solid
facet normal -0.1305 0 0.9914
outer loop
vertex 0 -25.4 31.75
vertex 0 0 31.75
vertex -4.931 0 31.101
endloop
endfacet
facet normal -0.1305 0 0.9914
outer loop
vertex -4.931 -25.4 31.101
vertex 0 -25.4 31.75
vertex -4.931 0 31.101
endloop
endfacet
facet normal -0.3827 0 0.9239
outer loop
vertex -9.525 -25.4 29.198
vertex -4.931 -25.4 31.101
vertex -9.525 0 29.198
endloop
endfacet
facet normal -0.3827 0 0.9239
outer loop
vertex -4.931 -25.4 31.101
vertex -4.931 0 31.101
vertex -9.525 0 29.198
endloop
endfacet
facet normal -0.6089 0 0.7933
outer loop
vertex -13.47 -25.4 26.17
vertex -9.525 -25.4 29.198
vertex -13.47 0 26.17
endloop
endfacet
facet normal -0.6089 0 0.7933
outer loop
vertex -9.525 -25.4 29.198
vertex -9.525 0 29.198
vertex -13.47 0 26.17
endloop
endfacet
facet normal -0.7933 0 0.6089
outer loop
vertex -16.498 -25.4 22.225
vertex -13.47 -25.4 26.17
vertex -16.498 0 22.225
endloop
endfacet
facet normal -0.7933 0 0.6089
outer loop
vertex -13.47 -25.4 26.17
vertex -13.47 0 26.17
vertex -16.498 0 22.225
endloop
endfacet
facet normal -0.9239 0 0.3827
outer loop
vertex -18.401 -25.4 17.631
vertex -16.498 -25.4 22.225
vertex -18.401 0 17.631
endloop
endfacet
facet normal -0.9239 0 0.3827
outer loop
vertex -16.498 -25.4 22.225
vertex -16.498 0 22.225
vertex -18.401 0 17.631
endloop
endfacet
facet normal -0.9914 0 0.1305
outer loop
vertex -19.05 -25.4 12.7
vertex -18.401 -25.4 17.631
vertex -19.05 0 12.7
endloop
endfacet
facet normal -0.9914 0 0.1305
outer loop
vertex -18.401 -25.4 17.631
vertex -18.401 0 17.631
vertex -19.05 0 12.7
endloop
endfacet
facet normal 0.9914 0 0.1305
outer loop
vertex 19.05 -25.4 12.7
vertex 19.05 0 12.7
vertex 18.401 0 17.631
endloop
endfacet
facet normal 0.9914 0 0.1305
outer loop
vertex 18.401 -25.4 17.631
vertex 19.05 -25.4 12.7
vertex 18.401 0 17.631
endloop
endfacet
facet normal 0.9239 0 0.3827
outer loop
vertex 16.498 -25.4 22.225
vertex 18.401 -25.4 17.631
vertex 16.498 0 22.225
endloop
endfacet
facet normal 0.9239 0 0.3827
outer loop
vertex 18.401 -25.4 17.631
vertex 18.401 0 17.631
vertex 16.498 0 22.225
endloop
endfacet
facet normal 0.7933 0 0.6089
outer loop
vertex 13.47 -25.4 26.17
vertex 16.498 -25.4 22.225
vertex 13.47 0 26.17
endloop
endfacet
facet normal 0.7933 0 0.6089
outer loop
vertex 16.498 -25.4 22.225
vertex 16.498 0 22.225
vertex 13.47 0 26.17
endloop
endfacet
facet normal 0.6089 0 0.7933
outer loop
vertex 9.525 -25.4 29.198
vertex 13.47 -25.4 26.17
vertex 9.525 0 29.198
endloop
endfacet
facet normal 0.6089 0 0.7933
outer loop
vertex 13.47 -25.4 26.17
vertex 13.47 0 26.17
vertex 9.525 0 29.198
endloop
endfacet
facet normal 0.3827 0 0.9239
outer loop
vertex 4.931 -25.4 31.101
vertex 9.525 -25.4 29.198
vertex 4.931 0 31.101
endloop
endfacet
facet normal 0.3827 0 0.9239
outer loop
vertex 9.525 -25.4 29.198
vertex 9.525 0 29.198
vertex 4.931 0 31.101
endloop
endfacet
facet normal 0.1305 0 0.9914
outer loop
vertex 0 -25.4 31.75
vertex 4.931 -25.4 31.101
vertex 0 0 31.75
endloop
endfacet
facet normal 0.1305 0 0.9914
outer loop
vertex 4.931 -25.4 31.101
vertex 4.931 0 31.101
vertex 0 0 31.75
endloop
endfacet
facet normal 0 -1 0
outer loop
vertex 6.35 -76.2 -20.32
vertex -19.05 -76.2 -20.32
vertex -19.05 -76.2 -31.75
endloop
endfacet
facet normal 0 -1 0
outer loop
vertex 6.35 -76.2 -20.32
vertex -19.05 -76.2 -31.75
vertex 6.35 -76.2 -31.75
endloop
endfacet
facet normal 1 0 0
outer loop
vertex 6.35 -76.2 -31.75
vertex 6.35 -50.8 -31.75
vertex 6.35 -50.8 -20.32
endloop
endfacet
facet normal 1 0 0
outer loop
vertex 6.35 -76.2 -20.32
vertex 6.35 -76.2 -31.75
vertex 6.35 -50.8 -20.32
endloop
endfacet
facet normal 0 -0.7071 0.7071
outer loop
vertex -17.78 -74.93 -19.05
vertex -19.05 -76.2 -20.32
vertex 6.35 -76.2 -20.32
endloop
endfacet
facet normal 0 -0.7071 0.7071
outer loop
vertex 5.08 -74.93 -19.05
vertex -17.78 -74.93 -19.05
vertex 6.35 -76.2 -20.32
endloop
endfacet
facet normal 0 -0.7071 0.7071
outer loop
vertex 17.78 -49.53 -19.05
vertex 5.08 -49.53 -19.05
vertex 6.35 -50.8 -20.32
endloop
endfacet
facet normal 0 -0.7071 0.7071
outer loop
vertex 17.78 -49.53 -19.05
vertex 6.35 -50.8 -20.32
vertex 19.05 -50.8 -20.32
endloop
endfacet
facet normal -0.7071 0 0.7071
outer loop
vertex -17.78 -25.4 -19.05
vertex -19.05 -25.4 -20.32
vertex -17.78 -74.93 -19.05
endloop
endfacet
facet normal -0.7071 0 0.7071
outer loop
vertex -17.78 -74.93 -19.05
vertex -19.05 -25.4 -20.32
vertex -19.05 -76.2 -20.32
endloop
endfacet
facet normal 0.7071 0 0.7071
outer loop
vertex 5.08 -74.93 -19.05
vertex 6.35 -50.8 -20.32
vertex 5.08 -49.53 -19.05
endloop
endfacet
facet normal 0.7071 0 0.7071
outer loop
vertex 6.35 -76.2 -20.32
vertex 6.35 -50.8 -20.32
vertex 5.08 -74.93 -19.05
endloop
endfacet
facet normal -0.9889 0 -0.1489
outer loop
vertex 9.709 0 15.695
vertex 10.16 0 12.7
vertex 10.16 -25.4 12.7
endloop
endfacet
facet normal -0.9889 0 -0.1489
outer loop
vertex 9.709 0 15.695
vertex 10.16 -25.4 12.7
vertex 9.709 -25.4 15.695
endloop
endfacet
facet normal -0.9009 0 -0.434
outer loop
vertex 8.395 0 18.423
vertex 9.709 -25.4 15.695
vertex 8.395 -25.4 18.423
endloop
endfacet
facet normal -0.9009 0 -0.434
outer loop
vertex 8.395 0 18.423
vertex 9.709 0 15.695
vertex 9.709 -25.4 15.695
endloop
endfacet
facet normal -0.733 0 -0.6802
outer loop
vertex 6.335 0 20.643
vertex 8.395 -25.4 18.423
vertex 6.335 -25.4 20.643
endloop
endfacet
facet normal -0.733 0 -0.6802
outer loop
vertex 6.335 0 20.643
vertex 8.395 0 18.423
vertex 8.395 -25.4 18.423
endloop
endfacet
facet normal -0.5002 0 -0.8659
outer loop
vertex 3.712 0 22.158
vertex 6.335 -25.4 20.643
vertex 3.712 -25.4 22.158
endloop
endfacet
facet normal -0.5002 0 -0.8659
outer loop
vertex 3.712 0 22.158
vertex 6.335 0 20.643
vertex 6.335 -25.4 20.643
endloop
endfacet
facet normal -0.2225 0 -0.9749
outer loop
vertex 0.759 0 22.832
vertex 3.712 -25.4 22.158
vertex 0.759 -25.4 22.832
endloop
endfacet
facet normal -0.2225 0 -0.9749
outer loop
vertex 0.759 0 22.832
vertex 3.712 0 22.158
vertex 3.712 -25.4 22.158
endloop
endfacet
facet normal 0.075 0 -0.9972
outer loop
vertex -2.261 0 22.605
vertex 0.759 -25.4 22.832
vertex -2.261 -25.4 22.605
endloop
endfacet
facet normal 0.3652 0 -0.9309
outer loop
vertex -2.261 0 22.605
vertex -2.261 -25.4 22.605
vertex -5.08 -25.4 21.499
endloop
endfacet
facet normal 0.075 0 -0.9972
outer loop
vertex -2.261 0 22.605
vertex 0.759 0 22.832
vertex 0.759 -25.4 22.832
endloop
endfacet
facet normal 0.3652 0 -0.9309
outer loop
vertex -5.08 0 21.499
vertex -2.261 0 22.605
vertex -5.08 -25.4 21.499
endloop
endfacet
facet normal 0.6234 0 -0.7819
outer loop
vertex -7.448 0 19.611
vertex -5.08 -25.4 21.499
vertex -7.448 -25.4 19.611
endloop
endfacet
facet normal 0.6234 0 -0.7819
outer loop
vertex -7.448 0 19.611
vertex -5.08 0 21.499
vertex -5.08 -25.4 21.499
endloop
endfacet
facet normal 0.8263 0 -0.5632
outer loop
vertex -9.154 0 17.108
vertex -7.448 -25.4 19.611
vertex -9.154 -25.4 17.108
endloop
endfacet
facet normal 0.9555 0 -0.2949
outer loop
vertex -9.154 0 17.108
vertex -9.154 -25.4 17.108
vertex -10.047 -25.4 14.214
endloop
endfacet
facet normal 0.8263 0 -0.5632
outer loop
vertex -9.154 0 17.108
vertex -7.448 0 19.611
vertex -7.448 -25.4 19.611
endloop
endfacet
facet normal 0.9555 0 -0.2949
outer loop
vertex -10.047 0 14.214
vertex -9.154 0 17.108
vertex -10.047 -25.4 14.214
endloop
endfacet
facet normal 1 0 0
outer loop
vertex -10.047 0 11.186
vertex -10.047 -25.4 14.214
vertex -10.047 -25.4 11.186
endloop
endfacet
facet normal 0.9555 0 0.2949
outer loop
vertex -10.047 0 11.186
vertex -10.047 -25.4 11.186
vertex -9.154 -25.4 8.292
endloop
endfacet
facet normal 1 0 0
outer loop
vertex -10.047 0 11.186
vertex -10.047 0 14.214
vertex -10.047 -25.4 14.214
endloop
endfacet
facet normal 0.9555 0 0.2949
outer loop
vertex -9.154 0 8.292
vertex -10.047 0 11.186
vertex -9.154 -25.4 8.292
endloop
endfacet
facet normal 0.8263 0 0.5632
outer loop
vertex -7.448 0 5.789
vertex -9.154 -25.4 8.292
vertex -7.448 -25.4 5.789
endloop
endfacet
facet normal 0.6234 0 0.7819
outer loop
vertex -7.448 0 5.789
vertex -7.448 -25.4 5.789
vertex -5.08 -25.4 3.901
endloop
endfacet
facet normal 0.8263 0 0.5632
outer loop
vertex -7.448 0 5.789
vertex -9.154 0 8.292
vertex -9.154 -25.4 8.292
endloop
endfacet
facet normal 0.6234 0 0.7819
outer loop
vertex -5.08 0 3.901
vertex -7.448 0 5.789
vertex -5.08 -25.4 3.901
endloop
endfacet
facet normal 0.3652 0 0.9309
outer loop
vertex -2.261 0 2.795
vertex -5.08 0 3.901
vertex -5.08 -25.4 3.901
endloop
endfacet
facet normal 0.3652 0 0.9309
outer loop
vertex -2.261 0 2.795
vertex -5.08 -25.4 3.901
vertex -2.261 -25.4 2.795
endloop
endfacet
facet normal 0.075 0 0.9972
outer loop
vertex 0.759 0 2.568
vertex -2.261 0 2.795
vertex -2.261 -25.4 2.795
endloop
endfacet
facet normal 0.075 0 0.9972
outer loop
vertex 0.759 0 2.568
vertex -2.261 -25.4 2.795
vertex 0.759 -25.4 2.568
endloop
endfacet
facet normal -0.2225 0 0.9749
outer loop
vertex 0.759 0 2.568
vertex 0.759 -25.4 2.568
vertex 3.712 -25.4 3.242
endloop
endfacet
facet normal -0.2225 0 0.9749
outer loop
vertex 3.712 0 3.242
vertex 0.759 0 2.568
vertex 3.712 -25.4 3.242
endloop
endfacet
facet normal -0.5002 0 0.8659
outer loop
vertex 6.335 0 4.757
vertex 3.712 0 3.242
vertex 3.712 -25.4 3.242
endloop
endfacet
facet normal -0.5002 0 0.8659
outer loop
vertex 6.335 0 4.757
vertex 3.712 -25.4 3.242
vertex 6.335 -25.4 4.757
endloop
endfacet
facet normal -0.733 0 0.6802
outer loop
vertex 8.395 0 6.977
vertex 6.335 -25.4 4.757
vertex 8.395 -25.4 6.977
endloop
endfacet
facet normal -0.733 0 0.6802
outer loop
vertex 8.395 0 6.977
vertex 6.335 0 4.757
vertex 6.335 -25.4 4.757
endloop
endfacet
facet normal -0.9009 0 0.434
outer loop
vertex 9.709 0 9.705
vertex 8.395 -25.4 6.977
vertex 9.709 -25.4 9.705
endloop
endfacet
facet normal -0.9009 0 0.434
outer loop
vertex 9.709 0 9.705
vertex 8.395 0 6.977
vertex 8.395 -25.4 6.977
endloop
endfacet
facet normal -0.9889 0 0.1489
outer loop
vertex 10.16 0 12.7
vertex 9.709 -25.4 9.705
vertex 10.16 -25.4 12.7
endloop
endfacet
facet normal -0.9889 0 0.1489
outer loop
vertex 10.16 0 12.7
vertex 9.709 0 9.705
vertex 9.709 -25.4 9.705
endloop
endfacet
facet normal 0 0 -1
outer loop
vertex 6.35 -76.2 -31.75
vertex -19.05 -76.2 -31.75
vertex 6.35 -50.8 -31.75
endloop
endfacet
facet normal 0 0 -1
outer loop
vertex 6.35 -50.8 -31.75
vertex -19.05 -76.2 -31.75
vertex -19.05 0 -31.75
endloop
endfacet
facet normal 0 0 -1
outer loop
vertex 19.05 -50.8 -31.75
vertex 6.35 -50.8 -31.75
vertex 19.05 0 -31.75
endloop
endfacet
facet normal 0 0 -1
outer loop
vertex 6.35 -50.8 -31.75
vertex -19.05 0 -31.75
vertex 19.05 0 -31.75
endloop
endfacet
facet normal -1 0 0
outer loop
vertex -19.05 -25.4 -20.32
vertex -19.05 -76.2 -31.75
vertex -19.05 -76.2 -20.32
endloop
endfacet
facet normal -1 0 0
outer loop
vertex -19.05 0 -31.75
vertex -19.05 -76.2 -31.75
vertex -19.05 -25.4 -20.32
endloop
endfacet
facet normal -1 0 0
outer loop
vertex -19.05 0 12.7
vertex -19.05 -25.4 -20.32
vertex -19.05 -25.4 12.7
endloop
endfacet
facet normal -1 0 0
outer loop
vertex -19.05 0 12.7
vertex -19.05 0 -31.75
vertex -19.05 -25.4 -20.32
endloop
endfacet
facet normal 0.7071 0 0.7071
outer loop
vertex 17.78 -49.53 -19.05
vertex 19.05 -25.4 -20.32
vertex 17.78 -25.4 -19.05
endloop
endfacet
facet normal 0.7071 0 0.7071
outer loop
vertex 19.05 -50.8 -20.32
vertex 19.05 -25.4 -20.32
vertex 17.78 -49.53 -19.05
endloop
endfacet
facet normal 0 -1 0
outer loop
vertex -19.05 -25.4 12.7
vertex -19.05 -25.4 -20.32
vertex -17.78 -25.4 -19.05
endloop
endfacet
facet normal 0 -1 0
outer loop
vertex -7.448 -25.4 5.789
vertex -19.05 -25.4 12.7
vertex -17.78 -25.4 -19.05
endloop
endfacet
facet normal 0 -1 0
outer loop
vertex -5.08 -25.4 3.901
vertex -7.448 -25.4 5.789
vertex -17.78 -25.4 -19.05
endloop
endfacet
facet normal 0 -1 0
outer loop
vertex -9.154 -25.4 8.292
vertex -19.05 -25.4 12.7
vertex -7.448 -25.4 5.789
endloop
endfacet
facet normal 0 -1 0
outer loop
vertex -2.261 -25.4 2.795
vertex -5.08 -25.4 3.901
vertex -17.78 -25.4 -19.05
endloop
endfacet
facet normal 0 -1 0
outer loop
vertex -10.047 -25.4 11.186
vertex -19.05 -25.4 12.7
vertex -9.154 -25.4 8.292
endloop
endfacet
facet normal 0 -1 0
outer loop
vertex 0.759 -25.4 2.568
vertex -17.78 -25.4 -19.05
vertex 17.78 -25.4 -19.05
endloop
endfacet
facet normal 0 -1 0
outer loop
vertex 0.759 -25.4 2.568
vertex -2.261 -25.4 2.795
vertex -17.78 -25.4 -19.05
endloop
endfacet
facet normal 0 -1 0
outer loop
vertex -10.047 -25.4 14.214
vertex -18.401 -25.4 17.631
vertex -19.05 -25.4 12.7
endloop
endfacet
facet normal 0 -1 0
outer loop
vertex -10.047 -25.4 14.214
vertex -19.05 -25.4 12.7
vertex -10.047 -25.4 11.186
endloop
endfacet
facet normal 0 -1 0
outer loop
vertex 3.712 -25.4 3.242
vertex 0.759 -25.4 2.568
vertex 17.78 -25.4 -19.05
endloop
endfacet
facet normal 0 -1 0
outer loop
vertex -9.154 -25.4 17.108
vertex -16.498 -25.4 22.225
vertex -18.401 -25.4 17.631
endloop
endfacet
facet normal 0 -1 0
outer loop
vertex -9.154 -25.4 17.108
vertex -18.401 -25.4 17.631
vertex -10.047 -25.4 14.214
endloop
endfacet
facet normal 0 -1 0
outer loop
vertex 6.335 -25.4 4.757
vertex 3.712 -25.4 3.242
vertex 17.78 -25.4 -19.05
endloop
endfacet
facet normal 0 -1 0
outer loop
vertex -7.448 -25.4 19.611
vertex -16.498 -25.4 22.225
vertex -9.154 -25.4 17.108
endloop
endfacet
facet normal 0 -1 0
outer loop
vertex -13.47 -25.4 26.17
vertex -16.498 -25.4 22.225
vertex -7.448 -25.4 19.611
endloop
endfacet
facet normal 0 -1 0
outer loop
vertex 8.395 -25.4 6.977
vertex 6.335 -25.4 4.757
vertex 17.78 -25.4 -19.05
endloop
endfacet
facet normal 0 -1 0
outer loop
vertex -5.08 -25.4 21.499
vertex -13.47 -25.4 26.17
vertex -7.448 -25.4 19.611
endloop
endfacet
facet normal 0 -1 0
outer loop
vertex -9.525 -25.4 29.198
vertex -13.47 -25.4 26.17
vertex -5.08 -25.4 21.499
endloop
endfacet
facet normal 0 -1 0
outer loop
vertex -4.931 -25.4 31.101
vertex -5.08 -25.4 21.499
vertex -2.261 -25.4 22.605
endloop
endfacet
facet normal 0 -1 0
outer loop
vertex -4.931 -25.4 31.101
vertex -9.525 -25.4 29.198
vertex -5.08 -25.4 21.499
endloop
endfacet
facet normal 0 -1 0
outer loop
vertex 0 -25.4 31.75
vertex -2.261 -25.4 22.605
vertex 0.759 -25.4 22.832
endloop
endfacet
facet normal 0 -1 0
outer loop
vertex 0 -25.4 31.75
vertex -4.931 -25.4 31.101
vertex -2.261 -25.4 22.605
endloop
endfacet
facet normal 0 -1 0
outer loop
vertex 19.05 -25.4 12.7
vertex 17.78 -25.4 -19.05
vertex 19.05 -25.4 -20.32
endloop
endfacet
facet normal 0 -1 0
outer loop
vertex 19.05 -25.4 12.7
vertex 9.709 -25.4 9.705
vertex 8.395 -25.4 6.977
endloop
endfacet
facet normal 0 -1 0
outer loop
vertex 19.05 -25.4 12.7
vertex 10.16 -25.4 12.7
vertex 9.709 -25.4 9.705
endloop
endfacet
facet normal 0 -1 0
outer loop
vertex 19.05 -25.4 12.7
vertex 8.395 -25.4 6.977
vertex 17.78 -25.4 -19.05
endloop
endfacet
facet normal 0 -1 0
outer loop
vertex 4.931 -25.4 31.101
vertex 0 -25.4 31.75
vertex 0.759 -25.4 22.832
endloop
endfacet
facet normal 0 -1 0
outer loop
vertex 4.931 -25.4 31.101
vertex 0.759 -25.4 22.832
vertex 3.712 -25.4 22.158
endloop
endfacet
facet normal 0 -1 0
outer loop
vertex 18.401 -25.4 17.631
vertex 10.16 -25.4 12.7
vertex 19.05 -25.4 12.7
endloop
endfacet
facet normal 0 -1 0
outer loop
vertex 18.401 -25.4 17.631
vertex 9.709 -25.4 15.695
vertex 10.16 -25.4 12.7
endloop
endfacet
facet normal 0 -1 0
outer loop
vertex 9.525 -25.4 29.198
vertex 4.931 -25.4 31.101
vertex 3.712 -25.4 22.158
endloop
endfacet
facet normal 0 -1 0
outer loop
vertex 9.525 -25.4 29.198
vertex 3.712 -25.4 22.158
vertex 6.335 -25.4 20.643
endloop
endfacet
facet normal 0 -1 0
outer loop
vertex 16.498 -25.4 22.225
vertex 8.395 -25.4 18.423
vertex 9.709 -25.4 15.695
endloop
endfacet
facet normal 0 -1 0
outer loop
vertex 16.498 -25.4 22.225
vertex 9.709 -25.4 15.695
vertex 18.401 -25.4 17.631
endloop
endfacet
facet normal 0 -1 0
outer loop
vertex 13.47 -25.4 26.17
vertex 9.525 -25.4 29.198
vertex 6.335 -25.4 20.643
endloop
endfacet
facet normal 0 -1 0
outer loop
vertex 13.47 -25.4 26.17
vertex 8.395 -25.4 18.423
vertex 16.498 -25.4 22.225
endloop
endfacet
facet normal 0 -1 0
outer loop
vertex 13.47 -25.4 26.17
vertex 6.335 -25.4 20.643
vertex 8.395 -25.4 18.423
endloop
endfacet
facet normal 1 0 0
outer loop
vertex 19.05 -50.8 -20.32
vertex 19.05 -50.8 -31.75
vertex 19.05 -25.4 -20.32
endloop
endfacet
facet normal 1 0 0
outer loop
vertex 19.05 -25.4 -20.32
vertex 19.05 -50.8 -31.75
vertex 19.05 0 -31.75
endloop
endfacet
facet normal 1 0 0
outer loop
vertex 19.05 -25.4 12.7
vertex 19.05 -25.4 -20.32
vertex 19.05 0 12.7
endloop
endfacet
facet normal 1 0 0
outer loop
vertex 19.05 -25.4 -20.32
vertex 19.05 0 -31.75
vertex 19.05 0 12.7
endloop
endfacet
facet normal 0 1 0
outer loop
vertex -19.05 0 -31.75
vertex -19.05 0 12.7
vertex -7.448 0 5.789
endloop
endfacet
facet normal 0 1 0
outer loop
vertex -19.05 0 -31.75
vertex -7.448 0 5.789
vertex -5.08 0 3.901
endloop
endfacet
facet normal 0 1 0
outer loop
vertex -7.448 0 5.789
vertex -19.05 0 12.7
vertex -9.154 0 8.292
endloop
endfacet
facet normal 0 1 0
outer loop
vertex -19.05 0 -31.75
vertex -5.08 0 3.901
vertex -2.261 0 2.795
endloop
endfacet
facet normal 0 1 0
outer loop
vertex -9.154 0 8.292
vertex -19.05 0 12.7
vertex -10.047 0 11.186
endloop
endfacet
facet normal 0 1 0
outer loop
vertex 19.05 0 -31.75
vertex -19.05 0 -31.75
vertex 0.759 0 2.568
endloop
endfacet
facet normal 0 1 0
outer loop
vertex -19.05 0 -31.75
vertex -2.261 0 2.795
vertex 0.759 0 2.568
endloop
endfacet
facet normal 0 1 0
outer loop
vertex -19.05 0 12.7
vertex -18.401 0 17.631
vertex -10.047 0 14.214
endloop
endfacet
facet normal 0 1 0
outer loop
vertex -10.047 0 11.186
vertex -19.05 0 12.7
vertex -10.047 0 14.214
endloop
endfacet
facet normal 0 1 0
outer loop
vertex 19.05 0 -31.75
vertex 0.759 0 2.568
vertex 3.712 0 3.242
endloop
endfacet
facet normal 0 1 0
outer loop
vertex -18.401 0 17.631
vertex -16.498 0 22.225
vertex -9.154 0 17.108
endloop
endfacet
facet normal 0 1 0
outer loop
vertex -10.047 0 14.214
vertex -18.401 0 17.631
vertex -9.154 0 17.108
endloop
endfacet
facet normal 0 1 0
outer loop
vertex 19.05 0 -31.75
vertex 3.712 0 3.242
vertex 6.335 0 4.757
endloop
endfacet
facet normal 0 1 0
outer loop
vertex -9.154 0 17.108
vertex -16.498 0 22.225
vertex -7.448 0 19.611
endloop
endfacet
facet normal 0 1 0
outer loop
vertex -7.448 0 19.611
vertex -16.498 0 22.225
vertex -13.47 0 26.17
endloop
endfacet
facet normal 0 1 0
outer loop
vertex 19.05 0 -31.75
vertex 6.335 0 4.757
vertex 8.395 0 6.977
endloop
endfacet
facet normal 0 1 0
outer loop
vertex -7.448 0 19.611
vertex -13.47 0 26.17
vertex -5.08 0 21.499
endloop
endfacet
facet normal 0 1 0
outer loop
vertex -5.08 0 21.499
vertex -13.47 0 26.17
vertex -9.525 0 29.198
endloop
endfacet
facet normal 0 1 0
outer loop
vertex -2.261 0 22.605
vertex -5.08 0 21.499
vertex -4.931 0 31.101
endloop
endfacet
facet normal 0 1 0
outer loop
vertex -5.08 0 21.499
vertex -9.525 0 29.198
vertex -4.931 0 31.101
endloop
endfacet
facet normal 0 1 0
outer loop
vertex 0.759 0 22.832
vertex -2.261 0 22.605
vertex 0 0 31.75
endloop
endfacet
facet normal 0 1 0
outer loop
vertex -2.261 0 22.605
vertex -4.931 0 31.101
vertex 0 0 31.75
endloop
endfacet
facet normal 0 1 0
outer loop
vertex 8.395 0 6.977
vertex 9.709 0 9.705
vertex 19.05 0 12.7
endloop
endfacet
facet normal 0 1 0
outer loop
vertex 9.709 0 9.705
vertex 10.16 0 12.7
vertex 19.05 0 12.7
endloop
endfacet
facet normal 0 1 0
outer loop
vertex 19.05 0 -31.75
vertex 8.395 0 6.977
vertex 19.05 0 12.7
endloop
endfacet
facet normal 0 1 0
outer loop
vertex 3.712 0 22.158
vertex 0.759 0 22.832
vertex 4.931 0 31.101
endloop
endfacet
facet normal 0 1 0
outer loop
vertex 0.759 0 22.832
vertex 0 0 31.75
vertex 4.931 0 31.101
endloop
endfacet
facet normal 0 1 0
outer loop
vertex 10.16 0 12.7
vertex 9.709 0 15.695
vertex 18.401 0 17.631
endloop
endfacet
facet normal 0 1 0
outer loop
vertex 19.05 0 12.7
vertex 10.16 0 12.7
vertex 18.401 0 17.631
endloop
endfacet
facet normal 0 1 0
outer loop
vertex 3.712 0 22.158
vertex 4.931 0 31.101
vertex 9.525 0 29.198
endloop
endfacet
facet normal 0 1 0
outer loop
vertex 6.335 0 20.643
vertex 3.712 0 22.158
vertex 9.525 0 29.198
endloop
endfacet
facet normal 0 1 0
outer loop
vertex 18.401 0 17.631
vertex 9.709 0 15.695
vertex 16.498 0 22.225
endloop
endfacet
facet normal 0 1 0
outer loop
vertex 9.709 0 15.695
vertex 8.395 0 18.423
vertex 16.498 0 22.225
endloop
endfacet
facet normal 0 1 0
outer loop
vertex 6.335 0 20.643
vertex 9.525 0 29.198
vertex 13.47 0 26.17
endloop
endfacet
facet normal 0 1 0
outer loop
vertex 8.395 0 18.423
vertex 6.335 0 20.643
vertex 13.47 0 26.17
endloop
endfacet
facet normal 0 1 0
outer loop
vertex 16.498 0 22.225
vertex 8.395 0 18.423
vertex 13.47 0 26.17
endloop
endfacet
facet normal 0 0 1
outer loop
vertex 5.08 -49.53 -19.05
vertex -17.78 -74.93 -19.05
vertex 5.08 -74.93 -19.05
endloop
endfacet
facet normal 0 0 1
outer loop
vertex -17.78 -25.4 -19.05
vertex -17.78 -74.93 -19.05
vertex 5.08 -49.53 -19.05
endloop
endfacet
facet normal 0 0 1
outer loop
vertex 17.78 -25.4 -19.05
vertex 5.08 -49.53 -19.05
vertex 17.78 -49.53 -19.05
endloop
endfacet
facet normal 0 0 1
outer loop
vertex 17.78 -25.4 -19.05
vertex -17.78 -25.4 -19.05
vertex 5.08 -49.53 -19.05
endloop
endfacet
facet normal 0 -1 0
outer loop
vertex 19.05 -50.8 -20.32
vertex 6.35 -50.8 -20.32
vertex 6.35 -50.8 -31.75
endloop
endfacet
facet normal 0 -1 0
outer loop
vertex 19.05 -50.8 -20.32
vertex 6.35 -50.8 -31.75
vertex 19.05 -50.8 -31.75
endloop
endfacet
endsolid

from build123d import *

# Parameters (mm, degrees)
F0_R     = 10.16
F1_DEPTH = 25.4
F2_W     = 25.4
F2_H     = 12.7
F3_DEPTH = 50.8
F4_W     = 12.7
F4_H     = 12.7
F5_DEPTH = 25.4
F6_SIZE  = 1.27


with BuildPart() as f1:
    # F0 (on Front) → F1 (new body)
    with BuildSketch(Plane.XZ):
        with BuildLine():
            Line((-19.05, 12.7), (-19.05, -31.75))
            Line((-19.05, -31.75), (19.05, -31.75))
            Line((19.05, -31.75), (19.05, 12.7))
            ThreePointArc((19.05, 12.7), (13.4703841797, 26.1703841835), (-5.4e-09, 31.75))
            ThreePointArc((-5.4e-09, 31.75), (-13.4703841835, 26.1703841797), (-19.05, 12.7))
        make_face()
        with Locations((0, 12.7)):
            Circle(F0_R, mode=Mode.SUBTRACT)
    extrude(amount=F1_DEPTH)

    # F2 (on face) → F3 (join)
    with BuildSketch(Plane.XZ.offset(25.4)):
        with Locations((-6.35, -25.4)):
            Rectangle(F2_W, F2_H)
    extrude(amount=F3_DEPTH)

    # F4 (on face) → F5 (join)
    with BuildSketch(Plane.XZ.offset(25.4)):
        with Locations((12.7, -25.4)):
            Rectangle(F4_W, F4_H)
    extrude(amount=F5_DEPTH)

    # F6
    f6_edges = [f1.edges().sort_by_distance(p)[0] for p in [
        (-19.05, -50.8, -19.05),
        (-6.35, -76.2, -19.05),
        (6.35, -63.5, -19.05),
        (12.7, -50.8, -19.05),
        (19.05, -38.1, -19.05),
    ]]
    chamfer(f6_edges, length=F6_SIZE)


solid = f1.part
